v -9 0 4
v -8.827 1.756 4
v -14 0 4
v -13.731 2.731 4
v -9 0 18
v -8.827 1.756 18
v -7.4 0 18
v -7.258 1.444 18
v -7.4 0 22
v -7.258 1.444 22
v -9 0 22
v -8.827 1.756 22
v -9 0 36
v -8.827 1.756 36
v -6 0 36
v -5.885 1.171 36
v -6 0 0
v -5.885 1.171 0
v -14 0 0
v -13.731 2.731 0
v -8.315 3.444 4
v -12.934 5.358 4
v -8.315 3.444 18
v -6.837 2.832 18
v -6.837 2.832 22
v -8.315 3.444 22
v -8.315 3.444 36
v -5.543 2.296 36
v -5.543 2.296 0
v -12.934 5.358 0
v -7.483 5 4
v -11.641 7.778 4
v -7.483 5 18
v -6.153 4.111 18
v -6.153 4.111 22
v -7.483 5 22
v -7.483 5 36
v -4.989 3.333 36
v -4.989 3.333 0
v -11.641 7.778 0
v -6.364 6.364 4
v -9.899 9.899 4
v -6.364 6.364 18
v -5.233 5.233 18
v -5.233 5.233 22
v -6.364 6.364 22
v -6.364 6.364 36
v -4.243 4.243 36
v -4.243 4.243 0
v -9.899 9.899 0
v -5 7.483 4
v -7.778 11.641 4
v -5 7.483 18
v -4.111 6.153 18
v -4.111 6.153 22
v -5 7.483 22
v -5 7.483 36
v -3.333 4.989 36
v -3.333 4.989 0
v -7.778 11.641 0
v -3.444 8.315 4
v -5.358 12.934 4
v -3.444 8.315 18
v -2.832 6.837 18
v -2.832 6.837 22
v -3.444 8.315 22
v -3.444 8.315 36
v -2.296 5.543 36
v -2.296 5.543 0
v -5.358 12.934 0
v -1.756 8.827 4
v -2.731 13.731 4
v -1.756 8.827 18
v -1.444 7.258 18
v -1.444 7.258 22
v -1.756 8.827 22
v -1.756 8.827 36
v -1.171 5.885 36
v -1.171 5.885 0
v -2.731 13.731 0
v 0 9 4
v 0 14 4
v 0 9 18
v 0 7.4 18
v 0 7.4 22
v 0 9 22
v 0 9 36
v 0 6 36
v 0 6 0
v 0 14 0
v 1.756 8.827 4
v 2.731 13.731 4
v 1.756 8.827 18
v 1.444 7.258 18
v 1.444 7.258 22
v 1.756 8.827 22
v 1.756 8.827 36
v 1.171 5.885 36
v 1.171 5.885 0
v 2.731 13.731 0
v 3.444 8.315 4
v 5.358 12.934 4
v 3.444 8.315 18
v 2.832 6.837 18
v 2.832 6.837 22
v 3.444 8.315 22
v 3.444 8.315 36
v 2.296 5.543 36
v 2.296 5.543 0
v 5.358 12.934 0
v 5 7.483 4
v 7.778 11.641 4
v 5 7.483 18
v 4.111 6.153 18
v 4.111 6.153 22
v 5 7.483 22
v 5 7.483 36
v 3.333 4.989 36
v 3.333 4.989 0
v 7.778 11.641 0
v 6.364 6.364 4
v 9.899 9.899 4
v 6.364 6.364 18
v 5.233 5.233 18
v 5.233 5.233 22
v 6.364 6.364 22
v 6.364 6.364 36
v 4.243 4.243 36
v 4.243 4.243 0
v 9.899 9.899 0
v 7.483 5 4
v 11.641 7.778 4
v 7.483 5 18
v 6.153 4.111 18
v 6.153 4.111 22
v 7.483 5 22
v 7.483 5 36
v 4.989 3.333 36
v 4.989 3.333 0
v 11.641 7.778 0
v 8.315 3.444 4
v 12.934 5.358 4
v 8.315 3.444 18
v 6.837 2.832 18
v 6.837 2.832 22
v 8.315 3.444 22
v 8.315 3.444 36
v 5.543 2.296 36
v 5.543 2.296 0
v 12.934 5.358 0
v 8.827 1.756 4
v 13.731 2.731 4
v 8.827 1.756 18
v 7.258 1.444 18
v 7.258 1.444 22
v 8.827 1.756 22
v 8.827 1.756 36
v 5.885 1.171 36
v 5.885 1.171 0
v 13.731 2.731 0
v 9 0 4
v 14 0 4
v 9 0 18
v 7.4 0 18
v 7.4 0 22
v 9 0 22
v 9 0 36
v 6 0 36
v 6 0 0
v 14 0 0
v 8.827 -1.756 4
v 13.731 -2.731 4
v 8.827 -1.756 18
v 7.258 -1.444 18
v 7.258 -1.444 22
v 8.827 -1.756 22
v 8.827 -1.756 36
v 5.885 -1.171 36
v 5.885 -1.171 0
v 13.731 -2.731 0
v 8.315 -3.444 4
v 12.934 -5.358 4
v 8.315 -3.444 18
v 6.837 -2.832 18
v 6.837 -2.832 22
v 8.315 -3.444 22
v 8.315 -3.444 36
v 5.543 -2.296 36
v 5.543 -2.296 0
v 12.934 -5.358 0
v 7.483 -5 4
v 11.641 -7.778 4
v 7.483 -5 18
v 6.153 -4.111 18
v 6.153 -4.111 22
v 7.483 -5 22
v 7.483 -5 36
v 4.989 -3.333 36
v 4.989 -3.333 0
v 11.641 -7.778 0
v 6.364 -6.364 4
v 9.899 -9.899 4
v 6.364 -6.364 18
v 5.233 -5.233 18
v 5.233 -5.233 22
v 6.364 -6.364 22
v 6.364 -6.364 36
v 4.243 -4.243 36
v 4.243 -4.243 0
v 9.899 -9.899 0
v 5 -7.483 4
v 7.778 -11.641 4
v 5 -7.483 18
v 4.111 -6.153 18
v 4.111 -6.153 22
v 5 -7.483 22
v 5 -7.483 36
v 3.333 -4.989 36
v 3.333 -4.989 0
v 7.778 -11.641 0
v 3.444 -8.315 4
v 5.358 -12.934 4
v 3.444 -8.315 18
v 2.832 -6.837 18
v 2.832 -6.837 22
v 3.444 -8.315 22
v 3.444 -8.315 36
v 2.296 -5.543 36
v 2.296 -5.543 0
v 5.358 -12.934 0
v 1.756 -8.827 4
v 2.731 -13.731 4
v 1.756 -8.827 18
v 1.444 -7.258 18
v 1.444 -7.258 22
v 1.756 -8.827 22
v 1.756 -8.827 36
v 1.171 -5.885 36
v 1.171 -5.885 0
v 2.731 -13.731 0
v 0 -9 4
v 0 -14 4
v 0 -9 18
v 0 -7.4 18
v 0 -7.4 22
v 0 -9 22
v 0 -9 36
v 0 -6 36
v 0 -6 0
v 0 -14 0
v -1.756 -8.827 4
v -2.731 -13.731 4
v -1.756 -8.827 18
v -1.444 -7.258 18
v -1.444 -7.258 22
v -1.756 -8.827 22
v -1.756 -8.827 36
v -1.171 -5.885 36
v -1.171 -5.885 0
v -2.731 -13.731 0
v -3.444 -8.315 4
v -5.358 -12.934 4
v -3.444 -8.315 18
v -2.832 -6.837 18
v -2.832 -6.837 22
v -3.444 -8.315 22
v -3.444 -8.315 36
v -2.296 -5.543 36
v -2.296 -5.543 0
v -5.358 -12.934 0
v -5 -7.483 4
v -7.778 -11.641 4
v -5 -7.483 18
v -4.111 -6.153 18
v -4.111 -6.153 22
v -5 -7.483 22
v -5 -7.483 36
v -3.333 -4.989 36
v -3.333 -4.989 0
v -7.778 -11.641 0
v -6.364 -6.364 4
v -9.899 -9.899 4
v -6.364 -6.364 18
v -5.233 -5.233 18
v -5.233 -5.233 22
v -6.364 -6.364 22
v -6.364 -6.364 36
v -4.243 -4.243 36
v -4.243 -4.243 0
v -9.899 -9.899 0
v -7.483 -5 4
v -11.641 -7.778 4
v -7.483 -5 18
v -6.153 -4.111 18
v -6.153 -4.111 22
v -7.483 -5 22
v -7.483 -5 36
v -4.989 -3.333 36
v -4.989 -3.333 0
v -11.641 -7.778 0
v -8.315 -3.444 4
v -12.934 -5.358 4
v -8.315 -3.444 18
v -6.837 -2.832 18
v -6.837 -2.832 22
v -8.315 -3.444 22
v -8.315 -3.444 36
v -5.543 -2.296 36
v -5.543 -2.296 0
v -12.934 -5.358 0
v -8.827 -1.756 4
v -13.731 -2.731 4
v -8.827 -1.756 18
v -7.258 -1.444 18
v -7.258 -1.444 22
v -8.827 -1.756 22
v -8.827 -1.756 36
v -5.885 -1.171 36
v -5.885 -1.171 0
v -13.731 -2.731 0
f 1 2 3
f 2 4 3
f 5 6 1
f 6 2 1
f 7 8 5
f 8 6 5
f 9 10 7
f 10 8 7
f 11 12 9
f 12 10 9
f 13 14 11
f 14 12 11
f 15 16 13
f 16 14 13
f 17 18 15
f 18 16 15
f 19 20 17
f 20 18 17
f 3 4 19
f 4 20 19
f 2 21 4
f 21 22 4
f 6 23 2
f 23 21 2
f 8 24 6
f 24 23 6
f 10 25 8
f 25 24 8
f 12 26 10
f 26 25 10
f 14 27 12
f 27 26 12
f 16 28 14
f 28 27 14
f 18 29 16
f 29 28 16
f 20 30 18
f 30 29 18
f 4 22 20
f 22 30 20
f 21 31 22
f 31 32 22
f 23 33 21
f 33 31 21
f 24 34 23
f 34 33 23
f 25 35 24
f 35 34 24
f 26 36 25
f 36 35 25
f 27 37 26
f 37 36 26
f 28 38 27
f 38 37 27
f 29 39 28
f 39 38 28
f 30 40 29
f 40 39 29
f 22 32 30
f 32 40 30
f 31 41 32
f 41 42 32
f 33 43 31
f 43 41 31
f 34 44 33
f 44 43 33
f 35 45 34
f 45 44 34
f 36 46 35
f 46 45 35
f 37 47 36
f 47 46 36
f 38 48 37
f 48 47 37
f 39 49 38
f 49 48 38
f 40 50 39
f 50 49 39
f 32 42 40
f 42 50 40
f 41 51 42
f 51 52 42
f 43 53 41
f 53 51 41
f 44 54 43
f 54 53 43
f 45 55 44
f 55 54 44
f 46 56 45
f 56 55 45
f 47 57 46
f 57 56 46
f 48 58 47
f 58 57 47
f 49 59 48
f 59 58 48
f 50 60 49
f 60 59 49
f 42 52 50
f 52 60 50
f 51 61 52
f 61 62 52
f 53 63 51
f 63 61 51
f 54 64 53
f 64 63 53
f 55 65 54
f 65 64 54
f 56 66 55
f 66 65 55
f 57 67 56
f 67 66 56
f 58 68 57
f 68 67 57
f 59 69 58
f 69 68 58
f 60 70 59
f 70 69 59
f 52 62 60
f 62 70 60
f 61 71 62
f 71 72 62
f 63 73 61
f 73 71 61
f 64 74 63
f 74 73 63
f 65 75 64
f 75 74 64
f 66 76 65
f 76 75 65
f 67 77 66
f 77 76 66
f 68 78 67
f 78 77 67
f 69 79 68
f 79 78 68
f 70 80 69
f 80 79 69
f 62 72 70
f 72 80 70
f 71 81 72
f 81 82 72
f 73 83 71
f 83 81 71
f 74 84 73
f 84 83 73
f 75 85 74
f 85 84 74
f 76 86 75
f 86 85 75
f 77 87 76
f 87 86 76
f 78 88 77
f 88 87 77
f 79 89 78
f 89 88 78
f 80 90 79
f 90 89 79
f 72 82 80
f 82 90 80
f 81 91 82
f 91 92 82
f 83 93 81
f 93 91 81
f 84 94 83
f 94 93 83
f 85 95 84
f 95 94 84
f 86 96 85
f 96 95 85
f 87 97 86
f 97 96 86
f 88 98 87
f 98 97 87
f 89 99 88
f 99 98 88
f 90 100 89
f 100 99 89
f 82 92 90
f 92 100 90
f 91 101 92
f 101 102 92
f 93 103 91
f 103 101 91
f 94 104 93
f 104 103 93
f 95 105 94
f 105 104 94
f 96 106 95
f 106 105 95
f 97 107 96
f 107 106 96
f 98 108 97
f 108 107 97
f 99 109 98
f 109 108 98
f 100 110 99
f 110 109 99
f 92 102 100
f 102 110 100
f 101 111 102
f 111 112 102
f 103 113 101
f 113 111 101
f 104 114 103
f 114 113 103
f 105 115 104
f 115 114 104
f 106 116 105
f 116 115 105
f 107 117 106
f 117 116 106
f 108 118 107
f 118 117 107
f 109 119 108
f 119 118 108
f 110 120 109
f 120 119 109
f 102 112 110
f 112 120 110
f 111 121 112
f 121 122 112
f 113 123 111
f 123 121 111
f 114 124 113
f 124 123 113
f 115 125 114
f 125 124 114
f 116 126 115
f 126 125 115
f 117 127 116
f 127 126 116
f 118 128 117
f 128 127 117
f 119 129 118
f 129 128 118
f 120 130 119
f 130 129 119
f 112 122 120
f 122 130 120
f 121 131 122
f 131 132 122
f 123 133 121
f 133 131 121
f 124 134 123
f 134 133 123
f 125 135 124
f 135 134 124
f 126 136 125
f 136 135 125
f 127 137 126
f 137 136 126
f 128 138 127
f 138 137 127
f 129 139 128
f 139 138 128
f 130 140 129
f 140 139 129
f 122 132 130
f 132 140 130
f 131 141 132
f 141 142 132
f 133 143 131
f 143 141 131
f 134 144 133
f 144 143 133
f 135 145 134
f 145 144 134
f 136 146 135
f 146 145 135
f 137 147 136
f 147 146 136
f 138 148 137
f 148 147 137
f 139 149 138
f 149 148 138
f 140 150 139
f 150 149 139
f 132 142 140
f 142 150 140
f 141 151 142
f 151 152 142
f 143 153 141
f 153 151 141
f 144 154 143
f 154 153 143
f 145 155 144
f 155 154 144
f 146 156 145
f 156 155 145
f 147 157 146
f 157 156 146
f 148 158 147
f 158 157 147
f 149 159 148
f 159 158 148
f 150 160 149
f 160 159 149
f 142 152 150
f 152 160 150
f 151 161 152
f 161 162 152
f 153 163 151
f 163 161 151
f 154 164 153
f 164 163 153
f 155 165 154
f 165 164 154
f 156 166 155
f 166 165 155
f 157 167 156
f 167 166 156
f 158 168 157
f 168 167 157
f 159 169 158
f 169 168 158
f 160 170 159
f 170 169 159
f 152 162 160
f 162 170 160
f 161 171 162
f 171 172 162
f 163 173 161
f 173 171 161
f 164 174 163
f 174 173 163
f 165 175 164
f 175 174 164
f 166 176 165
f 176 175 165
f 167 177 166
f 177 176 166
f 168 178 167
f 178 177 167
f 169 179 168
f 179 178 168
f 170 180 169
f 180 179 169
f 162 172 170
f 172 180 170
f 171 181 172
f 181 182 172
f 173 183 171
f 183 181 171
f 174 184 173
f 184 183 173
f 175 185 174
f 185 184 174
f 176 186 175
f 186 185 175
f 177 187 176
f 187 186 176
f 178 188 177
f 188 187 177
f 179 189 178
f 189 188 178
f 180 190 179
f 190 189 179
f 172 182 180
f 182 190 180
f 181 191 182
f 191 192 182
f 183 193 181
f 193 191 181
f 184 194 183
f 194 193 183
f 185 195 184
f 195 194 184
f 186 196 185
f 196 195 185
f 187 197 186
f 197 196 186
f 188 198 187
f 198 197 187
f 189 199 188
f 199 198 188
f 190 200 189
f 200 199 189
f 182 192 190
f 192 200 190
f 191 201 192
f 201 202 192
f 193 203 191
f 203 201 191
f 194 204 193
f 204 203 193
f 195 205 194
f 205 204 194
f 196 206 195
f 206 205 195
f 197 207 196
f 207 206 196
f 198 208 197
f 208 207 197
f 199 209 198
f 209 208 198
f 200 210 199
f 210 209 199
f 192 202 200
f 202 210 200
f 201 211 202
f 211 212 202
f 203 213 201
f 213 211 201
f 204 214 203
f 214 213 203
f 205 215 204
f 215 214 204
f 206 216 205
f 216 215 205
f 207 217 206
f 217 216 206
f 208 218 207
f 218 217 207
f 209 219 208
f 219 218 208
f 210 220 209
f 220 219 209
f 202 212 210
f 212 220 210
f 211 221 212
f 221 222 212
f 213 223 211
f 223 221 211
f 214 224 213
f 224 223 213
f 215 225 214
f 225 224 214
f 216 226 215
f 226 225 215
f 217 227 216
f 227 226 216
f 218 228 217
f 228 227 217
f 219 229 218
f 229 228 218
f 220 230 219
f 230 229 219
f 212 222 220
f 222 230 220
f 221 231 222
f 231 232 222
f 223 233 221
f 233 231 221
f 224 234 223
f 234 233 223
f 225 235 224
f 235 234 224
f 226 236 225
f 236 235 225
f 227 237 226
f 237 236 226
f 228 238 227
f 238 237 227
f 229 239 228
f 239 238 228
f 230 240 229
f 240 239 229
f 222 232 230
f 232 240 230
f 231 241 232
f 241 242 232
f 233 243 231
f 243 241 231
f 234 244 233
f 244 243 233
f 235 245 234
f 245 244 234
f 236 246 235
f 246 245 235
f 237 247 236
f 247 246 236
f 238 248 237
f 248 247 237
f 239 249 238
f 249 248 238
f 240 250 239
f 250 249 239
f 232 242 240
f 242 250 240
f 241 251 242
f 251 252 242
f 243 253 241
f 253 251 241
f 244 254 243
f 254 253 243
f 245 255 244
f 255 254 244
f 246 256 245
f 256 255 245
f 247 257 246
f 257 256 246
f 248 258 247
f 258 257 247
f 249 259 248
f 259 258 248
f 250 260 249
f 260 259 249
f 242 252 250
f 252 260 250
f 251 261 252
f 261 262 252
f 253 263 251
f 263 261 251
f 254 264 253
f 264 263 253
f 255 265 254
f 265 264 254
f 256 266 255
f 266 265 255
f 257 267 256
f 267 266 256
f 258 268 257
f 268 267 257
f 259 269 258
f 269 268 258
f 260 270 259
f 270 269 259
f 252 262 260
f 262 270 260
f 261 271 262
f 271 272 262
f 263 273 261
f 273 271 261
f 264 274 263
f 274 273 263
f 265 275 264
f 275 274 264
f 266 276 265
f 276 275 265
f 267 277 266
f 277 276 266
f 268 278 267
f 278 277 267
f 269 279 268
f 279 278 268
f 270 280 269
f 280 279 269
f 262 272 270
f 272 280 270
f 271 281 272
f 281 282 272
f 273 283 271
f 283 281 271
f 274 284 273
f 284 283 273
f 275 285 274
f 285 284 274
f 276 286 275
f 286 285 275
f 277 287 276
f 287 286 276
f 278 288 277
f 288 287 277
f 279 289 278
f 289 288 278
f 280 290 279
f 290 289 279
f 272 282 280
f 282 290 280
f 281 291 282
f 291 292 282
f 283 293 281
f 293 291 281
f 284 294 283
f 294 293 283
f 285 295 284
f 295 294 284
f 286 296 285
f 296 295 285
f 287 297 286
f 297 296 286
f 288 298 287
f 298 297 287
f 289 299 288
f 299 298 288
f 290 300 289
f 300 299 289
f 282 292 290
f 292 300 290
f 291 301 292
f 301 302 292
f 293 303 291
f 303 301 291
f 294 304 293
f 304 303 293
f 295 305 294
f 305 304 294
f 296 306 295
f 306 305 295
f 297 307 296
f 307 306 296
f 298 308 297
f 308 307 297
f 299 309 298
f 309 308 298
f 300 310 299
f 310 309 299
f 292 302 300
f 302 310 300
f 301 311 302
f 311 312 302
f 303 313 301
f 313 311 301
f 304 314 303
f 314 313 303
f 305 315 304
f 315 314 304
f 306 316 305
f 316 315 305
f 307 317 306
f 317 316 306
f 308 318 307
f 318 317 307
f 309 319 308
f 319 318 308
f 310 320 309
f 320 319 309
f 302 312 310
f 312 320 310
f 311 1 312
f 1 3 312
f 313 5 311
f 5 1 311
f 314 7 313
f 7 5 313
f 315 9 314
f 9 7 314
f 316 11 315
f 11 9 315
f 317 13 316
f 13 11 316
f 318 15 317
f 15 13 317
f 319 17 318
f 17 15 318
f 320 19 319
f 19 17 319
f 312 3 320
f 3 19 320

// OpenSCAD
$fn = 32;

// ----------------------------------------------------------------------
// Grooved revolve: flanged, bore R6
// ----------------------------------------------------------------------

// --- parameters (mm) ---
bore_r = 6;               // bore radius
outer_r = 9;              // outer radius of the body
total_h = 36;             // overall height, Z
wall = 3;                 // radial wall thickness
groove_w = 4;             // groove width
groove_d = 1.6;           // groove depth
grooves = 1;              // number of outer grooves
flange_r = 14;            // flange radius
flange_h = 4;             // flange height

bbox_x = 2 * flange_r;  // full diameter
bore_d = 2 * bore_r;  // bore diameter
body_d = 2 * outer_r;  // body diameter
flange_d = 2 * flange_r;  // flange diameter
revolve_angle = 360;  // full turn around the Z axis

profile = [[6, 0], [9, 0], [14, 0], [14, 4], [9, 4], [9, 18], [7.4, 18], [7.4, 22], [9, 22], [9, 36], [6, 36]];  // primary outline, 11 points, counter clockwise

// --- the one profile operation ---
rotate_extrude(angle = revolve_angle) polygon(points = profile);
